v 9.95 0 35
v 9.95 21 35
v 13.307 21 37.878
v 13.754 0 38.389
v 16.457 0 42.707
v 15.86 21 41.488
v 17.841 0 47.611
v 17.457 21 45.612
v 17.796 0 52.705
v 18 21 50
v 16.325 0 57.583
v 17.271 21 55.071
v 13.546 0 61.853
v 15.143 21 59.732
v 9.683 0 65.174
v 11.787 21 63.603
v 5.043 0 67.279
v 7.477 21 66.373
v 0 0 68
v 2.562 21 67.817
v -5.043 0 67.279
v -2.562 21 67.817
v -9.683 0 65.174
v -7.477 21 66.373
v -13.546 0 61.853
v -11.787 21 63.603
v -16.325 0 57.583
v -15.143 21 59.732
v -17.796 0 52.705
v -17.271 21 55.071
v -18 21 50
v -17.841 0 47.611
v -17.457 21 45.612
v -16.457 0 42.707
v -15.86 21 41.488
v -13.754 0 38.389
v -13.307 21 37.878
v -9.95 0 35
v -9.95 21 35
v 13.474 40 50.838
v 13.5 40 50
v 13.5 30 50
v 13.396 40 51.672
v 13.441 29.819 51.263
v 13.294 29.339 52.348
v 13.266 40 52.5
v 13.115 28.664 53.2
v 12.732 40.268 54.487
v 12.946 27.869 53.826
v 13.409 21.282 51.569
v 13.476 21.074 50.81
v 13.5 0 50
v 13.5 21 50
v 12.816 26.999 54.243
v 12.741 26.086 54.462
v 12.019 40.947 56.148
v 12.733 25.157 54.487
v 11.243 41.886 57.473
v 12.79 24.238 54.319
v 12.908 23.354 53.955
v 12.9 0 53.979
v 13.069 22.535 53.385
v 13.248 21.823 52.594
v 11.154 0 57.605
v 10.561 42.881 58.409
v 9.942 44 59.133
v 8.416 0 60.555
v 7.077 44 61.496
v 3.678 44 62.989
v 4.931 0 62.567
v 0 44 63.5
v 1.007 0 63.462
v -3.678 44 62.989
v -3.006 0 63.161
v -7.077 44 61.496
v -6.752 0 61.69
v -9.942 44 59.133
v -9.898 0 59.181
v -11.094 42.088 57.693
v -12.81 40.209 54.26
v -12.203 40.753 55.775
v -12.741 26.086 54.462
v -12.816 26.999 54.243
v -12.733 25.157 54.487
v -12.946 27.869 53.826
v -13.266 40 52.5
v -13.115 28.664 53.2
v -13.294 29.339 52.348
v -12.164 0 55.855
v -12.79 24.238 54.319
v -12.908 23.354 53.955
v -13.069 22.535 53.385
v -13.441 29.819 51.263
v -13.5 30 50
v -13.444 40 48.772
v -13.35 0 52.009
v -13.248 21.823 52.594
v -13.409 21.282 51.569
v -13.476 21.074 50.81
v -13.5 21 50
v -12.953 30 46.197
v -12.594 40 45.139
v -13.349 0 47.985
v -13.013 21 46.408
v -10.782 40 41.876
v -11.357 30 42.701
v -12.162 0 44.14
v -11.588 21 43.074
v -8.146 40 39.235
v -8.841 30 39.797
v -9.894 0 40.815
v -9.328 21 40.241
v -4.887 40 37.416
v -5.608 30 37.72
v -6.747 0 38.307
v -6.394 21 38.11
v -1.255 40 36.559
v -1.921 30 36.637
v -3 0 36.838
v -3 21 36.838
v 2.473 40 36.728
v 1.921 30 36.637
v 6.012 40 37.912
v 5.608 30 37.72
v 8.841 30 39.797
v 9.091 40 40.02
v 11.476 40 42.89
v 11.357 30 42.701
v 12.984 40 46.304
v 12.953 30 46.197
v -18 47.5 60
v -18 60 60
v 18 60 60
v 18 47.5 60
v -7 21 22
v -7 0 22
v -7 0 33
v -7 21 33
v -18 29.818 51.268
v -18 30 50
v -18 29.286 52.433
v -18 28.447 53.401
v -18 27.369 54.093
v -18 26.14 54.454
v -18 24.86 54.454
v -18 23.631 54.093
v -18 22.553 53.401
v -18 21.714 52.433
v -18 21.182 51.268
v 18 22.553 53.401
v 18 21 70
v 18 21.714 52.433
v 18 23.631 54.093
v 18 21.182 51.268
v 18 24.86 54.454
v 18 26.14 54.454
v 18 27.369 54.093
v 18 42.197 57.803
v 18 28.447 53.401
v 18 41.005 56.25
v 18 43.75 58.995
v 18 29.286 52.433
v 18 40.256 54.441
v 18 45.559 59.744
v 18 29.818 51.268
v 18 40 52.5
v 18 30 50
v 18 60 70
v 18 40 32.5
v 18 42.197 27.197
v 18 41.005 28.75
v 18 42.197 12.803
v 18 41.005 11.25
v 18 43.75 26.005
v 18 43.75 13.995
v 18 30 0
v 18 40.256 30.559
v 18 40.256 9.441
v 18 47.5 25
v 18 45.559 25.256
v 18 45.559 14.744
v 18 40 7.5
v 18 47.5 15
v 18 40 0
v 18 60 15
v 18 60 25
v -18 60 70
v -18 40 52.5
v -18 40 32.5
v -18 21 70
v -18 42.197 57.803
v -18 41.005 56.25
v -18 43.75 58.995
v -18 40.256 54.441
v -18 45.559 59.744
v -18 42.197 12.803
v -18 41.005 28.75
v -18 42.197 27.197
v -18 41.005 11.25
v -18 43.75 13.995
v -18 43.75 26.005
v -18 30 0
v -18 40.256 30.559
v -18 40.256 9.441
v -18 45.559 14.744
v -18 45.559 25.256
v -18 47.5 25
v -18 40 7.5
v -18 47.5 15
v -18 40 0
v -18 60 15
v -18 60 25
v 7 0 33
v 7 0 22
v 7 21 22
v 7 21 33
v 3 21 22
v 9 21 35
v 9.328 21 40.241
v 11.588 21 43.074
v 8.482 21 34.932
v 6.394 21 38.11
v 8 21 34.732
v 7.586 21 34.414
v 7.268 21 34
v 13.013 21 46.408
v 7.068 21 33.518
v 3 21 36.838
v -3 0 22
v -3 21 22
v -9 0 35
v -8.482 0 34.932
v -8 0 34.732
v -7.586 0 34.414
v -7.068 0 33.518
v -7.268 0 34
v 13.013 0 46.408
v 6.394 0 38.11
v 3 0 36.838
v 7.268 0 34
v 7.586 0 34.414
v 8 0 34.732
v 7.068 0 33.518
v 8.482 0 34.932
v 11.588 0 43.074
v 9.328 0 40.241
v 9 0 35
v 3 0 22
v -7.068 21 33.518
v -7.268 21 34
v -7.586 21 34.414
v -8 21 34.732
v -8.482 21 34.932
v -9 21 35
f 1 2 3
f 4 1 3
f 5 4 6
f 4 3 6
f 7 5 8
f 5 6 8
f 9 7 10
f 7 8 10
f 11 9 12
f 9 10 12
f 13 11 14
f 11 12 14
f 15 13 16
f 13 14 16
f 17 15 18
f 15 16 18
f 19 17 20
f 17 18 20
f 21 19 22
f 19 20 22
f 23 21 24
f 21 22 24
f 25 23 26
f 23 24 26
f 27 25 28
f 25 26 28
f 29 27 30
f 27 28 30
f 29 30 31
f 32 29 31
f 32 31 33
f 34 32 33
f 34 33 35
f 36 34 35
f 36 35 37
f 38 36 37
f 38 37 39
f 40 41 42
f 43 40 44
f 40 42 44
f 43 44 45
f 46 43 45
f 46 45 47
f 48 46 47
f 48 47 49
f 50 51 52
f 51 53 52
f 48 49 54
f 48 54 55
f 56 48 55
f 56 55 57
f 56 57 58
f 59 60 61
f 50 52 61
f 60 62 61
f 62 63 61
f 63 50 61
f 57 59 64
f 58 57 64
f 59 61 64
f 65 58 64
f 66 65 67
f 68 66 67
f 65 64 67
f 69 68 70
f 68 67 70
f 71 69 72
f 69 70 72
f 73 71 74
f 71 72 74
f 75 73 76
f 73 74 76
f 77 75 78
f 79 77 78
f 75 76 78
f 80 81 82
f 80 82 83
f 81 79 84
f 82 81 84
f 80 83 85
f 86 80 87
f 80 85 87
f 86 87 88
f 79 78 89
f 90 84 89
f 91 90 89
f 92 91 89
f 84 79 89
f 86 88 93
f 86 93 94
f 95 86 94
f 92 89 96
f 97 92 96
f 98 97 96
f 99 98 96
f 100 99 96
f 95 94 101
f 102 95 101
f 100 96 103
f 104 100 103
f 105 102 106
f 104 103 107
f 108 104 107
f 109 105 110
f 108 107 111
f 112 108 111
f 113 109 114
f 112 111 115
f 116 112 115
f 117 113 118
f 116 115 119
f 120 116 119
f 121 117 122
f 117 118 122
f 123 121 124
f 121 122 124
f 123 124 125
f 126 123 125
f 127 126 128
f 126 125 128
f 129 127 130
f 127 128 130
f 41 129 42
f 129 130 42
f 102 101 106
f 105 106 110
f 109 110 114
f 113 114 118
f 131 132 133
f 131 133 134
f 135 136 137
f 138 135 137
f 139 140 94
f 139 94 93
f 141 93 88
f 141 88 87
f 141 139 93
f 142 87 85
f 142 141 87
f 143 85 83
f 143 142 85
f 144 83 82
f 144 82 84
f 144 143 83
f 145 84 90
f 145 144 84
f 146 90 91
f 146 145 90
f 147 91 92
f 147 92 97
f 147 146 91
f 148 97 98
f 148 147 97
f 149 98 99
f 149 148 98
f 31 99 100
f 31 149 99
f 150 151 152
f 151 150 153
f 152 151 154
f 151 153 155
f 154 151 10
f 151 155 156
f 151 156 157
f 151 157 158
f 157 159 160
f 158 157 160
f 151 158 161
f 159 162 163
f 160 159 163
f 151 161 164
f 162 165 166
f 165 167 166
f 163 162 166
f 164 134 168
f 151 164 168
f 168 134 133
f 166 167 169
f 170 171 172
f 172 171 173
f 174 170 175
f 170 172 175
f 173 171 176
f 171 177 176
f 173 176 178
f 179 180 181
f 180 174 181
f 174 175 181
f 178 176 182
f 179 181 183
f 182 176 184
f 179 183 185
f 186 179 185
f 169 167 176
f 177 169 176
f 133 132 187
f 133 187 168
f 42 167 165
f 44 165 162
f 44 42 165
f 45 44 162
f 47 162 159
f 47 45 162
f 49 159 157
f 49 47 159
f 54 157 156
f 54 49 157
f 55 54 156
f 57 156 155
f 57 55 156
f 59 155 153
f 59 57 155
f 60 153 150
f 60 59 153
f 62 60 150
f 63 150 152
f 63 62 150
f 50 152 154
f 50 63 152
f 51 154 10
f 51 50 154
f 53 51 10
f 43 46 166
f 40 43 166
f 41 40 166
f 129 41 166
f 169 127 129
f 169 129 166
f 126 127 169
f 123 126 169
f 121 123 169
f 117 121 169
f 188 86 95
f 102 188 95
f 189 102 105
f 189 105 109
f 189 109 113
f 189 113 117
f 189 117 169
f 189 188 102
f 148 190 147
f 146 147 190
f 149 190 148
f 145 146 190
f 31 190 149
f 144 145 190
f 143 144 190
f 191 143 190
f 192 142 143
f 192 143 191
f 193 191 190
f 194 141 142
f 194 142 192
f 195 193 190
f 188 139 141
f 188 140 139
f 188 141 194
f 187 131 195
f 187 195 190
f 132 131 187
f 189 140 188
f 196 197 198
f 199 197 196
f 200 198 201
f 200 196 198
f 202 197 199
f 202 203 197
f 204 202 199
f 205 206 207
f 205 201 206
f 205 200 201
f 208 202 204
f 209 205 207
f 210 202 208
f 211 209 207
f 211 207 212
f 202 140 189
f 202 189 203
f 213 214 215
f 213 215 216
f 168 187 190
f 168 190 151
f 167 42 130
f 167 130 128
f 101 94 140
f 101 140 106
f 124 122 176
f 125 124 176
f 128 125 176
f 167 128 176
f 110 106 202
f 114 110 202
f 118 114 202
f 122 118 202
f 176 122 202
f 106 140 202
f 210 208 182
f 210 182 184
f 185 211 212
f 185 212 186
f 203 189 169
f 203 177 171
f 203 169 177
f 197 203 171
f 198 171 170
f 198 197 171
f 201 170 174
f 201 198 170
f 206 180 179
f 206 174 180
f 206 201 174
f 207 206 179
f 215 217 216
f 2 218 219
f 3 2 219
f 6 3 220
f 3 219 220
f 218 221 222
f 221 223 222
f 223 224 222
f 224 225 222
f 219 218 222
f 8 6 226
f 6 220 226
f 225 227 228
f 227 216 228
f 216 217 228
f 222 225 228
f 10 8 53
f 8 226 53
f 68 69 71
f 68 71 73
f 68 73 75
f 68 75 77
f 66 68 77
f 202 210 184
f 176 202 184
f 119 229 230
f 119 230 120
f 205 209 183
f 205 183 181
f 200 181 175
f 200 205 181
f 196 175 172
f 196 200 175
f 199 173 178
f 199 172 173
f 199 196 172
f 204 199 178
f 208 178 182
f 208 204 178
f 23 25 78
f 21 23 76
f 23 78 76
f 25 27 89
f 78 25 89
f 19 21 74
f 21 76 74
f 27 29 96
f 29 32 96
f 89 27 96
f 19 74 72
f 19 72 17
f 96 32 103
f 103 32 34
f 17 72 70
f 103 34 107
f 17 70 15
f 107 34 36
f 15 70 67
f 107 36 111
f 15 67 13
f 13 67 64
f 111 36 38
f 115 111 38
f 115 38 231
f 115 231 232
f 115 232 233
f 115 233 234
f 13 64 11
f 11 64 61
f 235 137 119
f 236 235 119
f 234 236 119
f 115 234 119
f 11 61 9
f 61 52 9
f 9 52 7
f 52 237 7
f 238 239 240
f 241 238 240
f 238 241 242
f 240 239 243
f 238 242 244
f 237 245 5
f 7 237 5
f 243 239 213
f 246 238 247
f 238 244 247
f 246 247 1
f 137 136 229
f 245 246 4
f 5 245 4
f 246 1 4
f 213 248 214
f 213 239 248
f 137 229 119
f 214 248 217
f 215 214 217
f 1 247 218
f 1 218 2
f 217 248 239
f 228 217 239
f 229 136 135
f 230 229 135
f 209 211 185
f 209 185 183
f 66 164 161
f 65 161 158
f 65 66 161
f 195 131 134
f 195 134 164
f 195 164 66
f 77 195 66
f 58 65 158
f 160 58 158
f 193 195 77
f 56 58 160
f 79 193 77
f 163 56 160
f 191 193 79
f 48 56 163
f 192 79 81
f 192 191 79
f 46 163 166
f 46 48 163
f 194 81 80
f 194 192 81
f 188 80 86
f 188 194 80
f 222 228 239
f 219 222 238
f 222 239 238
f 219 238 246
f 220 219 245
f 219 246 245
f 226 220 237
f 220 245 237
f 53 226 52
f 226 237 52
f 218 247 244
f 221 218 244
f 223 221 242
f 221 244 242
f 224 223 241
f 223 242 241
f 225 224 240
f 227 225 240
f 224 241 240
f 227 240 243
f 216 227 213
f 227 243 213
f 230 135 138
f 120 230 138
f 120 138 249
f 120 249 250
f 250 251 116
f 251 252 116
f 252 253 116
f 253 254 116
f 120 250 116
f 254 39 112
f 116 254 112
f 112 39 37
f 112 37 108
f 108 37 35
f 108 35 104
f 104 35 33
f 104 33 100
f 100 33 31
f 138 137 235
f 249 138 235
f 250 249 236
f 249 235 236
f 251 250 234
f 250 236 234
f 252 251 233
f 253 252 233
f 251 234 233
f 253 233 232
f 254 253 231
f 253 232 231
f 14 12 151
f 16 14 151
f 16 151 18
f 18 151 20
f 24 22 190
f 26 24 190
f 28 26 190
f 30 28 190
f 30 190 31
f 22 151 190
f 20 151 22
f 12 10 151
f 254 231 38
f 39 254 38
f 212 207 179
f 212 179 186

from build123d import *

# Parameters (mm, degrees)
SKETCH017_AS_DRAWN_W                 = 6
SKETCH017_AS_DRAWN_H                 = 25
EXTRUDE002_DEPTH                     = 30
EXTRUDE002_ONTO_SKETCH017_ROLL_ANGLE = 90
SKETCH016_AS_DRAWN_R                 = 13.5
EXTRUDE001_DEPTH                     = 45
EXTRUDE001_ONTO_SKETCH016_ROLL_ANGLE = 90
EXTRUDE_DEPTH                        = 38
SKETCH014_W                          = 22
SKETCH014_H                          = 20
BOX_W                                = 36
BOX_H                                = 60
BOX_DEPTH                            = 70


with BuildPart() as arc_ext:
    # Sketch017 as drawn → Extrude002 (new)
    with BuildSketch(Plane.XY):
        with BuildLine():
            Line((9, 35), (20, 35))
            Line((20, 35), (20, 20))
            Line((20, 20), (7, 20))
            Line((7, 20), (7, 33))
            ThreePointArc((9, 35), (7.585786, 34.414214), (7, 33))
        make_face()
        with BuildLine():
            Line((-9, 35), (-20, 35))
            Line((-20, 35), (-20, 20))
            Line((-20, 20), (-7, 20))
            Line((-7, 20), (-7, 33))
            ThreePointArc((-7, 33), (-7.585786, 34.414214), (-9, 35))
        make_face()
        with Locations((0, 27.5)):
            Rectangle(SKETCH017_AS_DRAWN_W, SKETCH017_AS_DRAWN_H)
    extrude(amount=-EXTRUDE002_DEPTH)


with BuildPart() as arc_ext_1:
    # Extrude002 onto Sketch017 roll: moved
    add(arc_ext.part.rotate(Axis((0, 0, 0), (1, 0, 0)), EXTRUDE002_ONTO_SKETCH017_ROLL_ANGLE))


with BuildPart() as arc_ext_2:
    # Extrude002 onto Sketch017 placement: moved
    add(arc_ext_1.part)


with BuildPart() as arc_ext_3:
    # Extrude002 placement: moved
    add(arc_ext_2.part.moved(Location((0, -1, 0))))


with BuildPart() as fusion:
    # Sketch016 as drawn → Extrude001 (new)
    with BuildSketch(Plane.XY):
        with Locations((0, 50)):
            Circle(SKETCH016_AS_DRAWN_R)
    extrude(amount=-EXTRUDE001_DEPTH)


with BuildPart() as fusion_1:
    # Extrude001 onto Sketch016 roll: moved
    add(fusion.part.rotate(Axis((0, 0, 0), (1, 0, 0)), EXTRUDE001_ONTO_SKETCH016_ROLL_ANGLE))


with BuildPart() as fusion_2:
    # Extrude001 onto Sketch016 placement: moved
    add(fusion_1.part)


with BuildPart() as fusion_3:
    # Extrude001 placement: moved
    add(fusion_2.part.moved(Location((0, -1, 0))))

    # Fusion: union arc-ext
    add(arc_ext_3.part)


with BuildPart() as extrude_body:
    # Sketch → Extrude (new body)
    with BuildSketch(Plane.YZ):
        with BuildLine():
            Line((61, 60), (47.5, 60))
            ThreePointArc((47.5, 60), (42.196699, 57.803301), (40, 52.5))
            Line((40, 52.5), (40, 32.5))
            ThreePointArc((40, 32.5), (42.196699, 27.196699), (47.5, 25))
            Line((47.5, 25), (61, 25))
            Line((61, 25), (61, 60))
        make_face()
        with BuildLine():
            Line((61, 15), (47.5, 15))
            ThreePointArc((47.5, 15), (42.196699, 12.803301), (40, 7.5))
            Line((40, 7.5), (40, -2))
            Line((40, -2), (61, -2))
            Line((61, -2), (61, 15))
        make_face()
        with BuildLine():
            Line((30, 50), (30, -2))
            Line((30, -2), (-2, -2))
            Line((-2, -2), (-2, 22))
            Line((-2, 22), (21, 22))
            Line((21, 22), (21, 50))
            ThreePointArc((30, 50), (25.5, 54.5), (21, 50))
        make_face()
    extrude(amount=EXTRUDE_DEPTH)


with BuildPart() as extrude_body_1:
    # Extrude placement: moved
    add(extrude_body.part.moved(Location((-19, 0, 0))))


with BuildPart() as sweep_body:
    # Sweep: sweep along a path in Sketch015
    with BuildLine(Plane.XZ) as sweep_path:
        ThreePointArc((4, 40.834849), (0, 60), (-4, 40.834849))
    # Sketch014 → Sweep (sweep)
    with BuildSketch(Plane(origin=(0, -1, 0), x_dir=(0, 1, 0), z_dir=(1, 0, 0))):
        with Locations((11, 78)):
            Rectangle(SKETCH014_W, SKETCH014_H)
    sweep(path=sweep_path.line)


with BuildPart() as cut002:
    # Box → Box (new body)
    with BuildSketch(Plane(origin=(-18, 0, 0), x_dir=(1, 0, 0), z_dir=(0, 0, 1))):
        with Locations((18, 30)):
            Rectangle(BOX_W, BOX_H)
    extrude(amount=BOX_DEPTH)

    # Cut: cut Sweep body
    add(sweep_body.part, mode=Mode.SUBTRACT)

    # Cut001: cut Extrude body
    add(extrude_body_1.part, mode=Mode.SUBTRACT)

    # Cut002: cut Fusion
    add(fusion_3.part, mode=Mode.SUBTRACT)


solid = cut002.part
